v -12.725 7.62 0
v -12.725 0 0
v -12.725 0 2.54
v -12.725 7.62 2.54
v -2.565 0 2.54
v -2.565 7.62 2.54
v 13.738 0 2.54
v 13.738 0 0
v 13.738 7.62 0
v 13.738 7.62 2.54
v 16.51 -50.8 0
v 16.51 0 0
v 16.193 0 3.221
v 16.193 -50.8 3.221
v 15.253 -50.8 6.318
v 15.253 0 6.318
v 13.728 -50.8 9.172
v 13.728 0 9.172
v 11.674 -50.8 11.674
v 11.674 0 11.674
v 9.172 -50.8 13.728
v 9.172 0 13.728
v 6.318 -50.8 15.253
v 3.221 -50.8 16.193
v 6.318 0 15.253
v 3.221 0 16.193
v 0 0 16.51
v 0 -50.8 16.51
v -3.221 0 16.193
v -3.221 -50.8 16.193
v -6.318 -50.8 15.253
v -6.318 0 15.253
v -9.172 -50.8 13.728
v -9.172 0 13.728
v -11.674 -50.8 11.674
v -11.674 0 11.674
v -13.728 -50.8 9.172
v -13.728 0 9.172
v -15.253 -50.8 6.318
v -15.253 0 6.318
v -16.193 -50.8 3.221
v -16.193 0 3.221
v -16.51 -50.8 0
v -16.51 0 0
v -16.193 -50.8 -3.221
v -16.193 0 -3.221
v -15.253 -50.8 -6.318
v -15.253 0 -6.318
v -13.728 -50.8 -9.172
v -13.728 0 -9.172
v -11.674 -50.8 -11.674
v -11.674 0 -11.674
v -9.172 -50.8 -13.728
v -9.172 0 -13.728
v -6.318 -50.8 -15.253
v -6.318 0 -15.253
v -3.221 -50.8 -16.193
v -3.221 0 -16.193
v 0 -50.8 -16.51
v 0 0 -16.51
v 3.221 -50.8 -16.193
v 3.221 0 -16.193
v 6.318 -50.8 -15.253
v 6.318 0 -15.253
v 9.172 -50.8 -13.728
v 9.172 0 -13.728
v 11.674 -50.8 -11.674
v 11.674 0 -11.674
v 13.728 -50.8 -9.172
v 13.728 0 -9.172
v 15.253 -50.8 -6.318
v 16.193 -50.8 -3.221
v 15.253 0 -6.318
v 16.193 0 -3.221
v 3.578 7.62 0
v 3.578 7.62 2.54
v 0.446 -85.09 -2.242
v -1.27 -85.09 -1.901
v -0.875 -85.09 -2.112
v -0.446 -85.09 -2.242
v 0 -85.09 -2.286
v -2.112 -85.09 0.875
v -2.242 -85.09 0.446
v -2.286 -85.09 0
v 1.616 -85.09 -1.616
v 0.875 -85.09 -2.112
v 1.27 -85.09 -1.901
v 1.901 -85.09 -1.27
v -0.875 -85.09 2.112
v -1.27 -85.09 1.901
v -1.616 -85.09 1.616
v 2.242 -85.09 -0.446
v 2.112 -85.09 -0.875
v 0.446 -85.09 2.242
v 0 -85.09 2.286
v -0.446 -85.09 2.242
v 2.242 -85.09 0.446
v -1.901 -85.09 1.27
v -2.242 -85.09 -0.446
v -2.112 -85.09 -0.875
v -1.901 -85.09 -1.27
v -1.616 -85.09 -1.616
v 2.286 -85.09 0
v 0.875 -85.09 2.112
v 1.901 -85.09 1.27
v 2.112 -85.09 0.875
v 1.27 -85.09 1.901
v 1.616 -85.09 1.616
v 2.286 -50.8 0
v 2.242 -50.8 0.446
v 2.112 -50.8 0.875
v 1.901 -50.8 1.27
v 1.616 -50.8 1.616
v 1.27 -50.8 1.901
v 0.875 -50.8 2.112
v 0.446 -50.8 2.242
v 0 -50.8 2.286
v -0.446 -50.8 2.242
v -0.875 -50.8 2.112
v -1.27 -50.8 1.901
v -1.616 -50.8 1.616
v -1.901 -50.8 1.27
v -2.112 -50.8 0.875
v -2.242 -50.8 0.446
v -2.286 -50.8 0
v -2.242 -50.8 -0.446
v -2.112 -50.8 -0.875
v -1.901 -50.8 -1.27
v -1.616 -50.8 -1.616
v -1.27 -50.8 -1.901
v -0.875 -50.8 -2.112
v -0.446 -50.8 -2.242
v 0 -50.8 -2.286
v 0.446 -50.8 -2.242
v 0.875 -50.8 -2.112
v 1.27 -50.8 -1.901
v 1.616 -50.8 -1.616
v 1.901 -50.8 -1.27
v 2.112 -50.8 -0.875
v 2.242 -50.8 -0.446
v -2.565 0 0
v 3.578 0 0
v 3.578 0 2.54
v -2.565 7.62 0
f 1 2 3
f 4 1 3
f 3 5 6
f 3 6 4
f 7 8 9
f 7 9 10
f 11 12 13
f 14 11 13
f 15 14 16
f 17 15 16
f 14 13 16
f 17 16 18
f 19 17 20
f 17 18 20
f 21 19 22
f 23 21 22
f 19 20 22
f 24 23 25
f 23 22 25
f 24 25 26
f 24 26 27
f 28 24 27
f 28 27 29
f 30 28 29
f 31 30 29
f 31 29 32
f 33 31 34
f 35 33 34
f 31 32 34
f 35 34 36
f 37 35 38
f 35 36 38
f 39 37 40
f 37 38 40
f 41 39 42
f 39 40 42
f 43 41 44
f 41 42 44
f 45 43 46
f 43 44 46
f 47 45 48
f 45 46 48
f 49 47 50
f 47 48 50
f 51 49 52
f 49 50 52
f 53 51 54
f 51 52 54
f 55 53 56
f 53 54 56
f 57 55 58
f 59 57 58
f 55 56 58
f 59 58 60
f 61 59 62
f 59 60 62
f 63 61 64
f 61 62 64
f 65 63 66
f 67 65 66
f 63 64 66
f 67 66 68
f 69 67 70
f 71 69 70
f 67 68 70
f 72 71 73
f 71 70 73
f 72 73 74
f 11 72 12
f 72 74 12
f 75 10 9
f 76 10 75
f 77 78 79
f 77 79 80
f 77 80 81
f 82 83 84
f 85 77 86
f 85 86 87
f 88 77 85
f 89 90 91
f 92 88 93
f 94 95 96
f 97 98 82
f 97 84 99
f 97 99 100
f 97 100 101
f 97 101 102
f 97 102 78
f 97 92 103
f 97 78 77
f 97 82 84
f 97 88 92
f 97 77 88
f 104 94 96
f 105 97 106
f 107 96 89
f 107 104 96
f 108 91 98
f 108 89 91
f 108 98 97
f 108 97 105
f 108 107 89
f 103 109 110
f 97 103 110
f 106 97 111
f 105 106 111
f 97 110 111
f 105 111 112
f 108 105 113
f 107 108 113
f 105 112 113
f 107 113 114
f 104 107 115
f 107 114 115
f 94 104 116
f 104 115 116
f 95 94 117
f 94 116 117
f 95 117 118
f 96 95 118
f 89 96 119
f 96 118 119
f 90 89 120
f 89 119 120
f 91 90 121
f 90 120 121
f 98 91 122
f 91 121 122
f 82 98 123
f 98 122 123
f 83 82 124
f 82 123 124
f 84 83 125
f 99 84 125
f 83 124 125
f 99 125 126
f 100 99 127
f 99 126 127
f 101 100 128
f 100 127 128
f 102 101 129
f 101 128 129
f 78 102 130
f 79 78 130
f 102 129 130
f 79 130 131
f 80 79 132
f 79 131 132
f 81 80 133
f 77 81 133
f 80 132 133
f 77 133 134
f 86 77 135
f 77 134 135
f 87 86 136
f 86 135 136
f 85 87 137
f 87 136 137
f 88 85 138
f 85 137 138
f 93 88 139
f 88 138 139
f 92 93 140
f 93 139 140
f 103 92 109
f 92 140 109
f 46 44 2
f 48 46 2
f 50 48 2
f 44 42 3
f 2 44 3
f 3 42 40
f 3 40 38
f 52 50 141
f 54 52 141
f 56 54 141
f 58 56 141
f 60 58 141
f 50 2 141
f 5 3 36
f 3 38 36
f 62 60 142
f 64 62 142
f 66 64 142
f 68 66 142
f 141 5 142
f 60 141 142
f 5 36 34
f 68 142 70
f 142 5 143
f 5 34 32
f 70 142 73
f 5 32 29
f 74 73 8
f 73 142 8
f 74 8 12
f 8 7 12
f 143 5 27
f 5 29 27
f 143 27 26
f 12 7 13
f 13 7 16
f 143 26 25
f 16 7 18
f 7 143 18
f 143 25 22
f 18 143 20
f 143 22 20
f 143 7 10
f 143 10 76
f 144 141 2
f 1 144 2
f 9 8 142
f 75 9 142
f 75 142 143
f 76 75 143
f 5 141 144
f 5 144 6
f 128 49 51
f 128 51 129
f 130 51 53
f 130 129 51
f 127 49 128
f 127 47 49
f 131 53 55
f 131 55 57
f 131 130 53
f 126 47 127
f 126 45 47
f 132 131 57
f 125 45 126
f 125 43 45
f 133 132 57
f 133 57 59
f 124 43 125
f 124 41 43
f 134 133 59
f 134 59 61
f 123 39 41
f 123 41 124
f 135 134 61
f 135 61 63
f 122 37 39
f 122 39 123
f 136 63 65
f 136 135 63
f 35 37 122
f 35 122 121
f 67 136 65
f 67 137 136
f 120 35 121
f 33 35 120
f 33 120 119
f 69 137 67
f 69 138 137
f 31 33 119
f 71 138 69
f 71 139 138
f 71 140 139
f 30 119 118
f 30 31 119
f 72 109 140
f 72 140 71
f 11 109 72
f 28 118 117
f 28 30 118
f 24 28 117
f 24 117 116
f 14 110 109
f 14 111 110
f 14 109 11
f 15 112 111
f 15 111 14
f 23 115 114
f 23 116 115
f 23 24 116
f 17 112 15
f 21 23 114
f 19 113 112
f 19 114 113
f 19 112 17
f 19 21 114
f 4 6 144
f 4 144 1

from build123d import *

# Parameters (mm, degrees)
F0_R     = 16.51
F1_DEPTH = 50.8
F2_R     = 2.286
F3_DEPTH = 34.29
F4_W     = 10.16
F4_H     = 2.54
F5_DEPTH = 7.62


with BuildPart() as f1:
    # F0 (on Front) → F1 (new body)
    with BuildSketch(Plane.XZ):
        Circle(F0_R)
    extrude(amount=F1_DEPTH)

    # F2 (on face) → F3 (join)
    with BuildSketch(Plane.XZ.offset(50.8)):
        Circle(F2_R)
    extrude(amount=F3_DEPTH)

    # F4 (on face) → F5 (join)
    with BuildSketch(Plane(origin=(0, 0, 0), x_dir=(-1, 0, 0), z_dir=(0, 1, 0))):
        with Locations((-8.658255, 1.27)):
            Rectangle(F4_W, F4_H)
        with Locations((7.64519, 1.27)):
            Rectangle(F4_W, F4_H)
    extrude(amount=F5_DEPTH)


solid = f1.part
